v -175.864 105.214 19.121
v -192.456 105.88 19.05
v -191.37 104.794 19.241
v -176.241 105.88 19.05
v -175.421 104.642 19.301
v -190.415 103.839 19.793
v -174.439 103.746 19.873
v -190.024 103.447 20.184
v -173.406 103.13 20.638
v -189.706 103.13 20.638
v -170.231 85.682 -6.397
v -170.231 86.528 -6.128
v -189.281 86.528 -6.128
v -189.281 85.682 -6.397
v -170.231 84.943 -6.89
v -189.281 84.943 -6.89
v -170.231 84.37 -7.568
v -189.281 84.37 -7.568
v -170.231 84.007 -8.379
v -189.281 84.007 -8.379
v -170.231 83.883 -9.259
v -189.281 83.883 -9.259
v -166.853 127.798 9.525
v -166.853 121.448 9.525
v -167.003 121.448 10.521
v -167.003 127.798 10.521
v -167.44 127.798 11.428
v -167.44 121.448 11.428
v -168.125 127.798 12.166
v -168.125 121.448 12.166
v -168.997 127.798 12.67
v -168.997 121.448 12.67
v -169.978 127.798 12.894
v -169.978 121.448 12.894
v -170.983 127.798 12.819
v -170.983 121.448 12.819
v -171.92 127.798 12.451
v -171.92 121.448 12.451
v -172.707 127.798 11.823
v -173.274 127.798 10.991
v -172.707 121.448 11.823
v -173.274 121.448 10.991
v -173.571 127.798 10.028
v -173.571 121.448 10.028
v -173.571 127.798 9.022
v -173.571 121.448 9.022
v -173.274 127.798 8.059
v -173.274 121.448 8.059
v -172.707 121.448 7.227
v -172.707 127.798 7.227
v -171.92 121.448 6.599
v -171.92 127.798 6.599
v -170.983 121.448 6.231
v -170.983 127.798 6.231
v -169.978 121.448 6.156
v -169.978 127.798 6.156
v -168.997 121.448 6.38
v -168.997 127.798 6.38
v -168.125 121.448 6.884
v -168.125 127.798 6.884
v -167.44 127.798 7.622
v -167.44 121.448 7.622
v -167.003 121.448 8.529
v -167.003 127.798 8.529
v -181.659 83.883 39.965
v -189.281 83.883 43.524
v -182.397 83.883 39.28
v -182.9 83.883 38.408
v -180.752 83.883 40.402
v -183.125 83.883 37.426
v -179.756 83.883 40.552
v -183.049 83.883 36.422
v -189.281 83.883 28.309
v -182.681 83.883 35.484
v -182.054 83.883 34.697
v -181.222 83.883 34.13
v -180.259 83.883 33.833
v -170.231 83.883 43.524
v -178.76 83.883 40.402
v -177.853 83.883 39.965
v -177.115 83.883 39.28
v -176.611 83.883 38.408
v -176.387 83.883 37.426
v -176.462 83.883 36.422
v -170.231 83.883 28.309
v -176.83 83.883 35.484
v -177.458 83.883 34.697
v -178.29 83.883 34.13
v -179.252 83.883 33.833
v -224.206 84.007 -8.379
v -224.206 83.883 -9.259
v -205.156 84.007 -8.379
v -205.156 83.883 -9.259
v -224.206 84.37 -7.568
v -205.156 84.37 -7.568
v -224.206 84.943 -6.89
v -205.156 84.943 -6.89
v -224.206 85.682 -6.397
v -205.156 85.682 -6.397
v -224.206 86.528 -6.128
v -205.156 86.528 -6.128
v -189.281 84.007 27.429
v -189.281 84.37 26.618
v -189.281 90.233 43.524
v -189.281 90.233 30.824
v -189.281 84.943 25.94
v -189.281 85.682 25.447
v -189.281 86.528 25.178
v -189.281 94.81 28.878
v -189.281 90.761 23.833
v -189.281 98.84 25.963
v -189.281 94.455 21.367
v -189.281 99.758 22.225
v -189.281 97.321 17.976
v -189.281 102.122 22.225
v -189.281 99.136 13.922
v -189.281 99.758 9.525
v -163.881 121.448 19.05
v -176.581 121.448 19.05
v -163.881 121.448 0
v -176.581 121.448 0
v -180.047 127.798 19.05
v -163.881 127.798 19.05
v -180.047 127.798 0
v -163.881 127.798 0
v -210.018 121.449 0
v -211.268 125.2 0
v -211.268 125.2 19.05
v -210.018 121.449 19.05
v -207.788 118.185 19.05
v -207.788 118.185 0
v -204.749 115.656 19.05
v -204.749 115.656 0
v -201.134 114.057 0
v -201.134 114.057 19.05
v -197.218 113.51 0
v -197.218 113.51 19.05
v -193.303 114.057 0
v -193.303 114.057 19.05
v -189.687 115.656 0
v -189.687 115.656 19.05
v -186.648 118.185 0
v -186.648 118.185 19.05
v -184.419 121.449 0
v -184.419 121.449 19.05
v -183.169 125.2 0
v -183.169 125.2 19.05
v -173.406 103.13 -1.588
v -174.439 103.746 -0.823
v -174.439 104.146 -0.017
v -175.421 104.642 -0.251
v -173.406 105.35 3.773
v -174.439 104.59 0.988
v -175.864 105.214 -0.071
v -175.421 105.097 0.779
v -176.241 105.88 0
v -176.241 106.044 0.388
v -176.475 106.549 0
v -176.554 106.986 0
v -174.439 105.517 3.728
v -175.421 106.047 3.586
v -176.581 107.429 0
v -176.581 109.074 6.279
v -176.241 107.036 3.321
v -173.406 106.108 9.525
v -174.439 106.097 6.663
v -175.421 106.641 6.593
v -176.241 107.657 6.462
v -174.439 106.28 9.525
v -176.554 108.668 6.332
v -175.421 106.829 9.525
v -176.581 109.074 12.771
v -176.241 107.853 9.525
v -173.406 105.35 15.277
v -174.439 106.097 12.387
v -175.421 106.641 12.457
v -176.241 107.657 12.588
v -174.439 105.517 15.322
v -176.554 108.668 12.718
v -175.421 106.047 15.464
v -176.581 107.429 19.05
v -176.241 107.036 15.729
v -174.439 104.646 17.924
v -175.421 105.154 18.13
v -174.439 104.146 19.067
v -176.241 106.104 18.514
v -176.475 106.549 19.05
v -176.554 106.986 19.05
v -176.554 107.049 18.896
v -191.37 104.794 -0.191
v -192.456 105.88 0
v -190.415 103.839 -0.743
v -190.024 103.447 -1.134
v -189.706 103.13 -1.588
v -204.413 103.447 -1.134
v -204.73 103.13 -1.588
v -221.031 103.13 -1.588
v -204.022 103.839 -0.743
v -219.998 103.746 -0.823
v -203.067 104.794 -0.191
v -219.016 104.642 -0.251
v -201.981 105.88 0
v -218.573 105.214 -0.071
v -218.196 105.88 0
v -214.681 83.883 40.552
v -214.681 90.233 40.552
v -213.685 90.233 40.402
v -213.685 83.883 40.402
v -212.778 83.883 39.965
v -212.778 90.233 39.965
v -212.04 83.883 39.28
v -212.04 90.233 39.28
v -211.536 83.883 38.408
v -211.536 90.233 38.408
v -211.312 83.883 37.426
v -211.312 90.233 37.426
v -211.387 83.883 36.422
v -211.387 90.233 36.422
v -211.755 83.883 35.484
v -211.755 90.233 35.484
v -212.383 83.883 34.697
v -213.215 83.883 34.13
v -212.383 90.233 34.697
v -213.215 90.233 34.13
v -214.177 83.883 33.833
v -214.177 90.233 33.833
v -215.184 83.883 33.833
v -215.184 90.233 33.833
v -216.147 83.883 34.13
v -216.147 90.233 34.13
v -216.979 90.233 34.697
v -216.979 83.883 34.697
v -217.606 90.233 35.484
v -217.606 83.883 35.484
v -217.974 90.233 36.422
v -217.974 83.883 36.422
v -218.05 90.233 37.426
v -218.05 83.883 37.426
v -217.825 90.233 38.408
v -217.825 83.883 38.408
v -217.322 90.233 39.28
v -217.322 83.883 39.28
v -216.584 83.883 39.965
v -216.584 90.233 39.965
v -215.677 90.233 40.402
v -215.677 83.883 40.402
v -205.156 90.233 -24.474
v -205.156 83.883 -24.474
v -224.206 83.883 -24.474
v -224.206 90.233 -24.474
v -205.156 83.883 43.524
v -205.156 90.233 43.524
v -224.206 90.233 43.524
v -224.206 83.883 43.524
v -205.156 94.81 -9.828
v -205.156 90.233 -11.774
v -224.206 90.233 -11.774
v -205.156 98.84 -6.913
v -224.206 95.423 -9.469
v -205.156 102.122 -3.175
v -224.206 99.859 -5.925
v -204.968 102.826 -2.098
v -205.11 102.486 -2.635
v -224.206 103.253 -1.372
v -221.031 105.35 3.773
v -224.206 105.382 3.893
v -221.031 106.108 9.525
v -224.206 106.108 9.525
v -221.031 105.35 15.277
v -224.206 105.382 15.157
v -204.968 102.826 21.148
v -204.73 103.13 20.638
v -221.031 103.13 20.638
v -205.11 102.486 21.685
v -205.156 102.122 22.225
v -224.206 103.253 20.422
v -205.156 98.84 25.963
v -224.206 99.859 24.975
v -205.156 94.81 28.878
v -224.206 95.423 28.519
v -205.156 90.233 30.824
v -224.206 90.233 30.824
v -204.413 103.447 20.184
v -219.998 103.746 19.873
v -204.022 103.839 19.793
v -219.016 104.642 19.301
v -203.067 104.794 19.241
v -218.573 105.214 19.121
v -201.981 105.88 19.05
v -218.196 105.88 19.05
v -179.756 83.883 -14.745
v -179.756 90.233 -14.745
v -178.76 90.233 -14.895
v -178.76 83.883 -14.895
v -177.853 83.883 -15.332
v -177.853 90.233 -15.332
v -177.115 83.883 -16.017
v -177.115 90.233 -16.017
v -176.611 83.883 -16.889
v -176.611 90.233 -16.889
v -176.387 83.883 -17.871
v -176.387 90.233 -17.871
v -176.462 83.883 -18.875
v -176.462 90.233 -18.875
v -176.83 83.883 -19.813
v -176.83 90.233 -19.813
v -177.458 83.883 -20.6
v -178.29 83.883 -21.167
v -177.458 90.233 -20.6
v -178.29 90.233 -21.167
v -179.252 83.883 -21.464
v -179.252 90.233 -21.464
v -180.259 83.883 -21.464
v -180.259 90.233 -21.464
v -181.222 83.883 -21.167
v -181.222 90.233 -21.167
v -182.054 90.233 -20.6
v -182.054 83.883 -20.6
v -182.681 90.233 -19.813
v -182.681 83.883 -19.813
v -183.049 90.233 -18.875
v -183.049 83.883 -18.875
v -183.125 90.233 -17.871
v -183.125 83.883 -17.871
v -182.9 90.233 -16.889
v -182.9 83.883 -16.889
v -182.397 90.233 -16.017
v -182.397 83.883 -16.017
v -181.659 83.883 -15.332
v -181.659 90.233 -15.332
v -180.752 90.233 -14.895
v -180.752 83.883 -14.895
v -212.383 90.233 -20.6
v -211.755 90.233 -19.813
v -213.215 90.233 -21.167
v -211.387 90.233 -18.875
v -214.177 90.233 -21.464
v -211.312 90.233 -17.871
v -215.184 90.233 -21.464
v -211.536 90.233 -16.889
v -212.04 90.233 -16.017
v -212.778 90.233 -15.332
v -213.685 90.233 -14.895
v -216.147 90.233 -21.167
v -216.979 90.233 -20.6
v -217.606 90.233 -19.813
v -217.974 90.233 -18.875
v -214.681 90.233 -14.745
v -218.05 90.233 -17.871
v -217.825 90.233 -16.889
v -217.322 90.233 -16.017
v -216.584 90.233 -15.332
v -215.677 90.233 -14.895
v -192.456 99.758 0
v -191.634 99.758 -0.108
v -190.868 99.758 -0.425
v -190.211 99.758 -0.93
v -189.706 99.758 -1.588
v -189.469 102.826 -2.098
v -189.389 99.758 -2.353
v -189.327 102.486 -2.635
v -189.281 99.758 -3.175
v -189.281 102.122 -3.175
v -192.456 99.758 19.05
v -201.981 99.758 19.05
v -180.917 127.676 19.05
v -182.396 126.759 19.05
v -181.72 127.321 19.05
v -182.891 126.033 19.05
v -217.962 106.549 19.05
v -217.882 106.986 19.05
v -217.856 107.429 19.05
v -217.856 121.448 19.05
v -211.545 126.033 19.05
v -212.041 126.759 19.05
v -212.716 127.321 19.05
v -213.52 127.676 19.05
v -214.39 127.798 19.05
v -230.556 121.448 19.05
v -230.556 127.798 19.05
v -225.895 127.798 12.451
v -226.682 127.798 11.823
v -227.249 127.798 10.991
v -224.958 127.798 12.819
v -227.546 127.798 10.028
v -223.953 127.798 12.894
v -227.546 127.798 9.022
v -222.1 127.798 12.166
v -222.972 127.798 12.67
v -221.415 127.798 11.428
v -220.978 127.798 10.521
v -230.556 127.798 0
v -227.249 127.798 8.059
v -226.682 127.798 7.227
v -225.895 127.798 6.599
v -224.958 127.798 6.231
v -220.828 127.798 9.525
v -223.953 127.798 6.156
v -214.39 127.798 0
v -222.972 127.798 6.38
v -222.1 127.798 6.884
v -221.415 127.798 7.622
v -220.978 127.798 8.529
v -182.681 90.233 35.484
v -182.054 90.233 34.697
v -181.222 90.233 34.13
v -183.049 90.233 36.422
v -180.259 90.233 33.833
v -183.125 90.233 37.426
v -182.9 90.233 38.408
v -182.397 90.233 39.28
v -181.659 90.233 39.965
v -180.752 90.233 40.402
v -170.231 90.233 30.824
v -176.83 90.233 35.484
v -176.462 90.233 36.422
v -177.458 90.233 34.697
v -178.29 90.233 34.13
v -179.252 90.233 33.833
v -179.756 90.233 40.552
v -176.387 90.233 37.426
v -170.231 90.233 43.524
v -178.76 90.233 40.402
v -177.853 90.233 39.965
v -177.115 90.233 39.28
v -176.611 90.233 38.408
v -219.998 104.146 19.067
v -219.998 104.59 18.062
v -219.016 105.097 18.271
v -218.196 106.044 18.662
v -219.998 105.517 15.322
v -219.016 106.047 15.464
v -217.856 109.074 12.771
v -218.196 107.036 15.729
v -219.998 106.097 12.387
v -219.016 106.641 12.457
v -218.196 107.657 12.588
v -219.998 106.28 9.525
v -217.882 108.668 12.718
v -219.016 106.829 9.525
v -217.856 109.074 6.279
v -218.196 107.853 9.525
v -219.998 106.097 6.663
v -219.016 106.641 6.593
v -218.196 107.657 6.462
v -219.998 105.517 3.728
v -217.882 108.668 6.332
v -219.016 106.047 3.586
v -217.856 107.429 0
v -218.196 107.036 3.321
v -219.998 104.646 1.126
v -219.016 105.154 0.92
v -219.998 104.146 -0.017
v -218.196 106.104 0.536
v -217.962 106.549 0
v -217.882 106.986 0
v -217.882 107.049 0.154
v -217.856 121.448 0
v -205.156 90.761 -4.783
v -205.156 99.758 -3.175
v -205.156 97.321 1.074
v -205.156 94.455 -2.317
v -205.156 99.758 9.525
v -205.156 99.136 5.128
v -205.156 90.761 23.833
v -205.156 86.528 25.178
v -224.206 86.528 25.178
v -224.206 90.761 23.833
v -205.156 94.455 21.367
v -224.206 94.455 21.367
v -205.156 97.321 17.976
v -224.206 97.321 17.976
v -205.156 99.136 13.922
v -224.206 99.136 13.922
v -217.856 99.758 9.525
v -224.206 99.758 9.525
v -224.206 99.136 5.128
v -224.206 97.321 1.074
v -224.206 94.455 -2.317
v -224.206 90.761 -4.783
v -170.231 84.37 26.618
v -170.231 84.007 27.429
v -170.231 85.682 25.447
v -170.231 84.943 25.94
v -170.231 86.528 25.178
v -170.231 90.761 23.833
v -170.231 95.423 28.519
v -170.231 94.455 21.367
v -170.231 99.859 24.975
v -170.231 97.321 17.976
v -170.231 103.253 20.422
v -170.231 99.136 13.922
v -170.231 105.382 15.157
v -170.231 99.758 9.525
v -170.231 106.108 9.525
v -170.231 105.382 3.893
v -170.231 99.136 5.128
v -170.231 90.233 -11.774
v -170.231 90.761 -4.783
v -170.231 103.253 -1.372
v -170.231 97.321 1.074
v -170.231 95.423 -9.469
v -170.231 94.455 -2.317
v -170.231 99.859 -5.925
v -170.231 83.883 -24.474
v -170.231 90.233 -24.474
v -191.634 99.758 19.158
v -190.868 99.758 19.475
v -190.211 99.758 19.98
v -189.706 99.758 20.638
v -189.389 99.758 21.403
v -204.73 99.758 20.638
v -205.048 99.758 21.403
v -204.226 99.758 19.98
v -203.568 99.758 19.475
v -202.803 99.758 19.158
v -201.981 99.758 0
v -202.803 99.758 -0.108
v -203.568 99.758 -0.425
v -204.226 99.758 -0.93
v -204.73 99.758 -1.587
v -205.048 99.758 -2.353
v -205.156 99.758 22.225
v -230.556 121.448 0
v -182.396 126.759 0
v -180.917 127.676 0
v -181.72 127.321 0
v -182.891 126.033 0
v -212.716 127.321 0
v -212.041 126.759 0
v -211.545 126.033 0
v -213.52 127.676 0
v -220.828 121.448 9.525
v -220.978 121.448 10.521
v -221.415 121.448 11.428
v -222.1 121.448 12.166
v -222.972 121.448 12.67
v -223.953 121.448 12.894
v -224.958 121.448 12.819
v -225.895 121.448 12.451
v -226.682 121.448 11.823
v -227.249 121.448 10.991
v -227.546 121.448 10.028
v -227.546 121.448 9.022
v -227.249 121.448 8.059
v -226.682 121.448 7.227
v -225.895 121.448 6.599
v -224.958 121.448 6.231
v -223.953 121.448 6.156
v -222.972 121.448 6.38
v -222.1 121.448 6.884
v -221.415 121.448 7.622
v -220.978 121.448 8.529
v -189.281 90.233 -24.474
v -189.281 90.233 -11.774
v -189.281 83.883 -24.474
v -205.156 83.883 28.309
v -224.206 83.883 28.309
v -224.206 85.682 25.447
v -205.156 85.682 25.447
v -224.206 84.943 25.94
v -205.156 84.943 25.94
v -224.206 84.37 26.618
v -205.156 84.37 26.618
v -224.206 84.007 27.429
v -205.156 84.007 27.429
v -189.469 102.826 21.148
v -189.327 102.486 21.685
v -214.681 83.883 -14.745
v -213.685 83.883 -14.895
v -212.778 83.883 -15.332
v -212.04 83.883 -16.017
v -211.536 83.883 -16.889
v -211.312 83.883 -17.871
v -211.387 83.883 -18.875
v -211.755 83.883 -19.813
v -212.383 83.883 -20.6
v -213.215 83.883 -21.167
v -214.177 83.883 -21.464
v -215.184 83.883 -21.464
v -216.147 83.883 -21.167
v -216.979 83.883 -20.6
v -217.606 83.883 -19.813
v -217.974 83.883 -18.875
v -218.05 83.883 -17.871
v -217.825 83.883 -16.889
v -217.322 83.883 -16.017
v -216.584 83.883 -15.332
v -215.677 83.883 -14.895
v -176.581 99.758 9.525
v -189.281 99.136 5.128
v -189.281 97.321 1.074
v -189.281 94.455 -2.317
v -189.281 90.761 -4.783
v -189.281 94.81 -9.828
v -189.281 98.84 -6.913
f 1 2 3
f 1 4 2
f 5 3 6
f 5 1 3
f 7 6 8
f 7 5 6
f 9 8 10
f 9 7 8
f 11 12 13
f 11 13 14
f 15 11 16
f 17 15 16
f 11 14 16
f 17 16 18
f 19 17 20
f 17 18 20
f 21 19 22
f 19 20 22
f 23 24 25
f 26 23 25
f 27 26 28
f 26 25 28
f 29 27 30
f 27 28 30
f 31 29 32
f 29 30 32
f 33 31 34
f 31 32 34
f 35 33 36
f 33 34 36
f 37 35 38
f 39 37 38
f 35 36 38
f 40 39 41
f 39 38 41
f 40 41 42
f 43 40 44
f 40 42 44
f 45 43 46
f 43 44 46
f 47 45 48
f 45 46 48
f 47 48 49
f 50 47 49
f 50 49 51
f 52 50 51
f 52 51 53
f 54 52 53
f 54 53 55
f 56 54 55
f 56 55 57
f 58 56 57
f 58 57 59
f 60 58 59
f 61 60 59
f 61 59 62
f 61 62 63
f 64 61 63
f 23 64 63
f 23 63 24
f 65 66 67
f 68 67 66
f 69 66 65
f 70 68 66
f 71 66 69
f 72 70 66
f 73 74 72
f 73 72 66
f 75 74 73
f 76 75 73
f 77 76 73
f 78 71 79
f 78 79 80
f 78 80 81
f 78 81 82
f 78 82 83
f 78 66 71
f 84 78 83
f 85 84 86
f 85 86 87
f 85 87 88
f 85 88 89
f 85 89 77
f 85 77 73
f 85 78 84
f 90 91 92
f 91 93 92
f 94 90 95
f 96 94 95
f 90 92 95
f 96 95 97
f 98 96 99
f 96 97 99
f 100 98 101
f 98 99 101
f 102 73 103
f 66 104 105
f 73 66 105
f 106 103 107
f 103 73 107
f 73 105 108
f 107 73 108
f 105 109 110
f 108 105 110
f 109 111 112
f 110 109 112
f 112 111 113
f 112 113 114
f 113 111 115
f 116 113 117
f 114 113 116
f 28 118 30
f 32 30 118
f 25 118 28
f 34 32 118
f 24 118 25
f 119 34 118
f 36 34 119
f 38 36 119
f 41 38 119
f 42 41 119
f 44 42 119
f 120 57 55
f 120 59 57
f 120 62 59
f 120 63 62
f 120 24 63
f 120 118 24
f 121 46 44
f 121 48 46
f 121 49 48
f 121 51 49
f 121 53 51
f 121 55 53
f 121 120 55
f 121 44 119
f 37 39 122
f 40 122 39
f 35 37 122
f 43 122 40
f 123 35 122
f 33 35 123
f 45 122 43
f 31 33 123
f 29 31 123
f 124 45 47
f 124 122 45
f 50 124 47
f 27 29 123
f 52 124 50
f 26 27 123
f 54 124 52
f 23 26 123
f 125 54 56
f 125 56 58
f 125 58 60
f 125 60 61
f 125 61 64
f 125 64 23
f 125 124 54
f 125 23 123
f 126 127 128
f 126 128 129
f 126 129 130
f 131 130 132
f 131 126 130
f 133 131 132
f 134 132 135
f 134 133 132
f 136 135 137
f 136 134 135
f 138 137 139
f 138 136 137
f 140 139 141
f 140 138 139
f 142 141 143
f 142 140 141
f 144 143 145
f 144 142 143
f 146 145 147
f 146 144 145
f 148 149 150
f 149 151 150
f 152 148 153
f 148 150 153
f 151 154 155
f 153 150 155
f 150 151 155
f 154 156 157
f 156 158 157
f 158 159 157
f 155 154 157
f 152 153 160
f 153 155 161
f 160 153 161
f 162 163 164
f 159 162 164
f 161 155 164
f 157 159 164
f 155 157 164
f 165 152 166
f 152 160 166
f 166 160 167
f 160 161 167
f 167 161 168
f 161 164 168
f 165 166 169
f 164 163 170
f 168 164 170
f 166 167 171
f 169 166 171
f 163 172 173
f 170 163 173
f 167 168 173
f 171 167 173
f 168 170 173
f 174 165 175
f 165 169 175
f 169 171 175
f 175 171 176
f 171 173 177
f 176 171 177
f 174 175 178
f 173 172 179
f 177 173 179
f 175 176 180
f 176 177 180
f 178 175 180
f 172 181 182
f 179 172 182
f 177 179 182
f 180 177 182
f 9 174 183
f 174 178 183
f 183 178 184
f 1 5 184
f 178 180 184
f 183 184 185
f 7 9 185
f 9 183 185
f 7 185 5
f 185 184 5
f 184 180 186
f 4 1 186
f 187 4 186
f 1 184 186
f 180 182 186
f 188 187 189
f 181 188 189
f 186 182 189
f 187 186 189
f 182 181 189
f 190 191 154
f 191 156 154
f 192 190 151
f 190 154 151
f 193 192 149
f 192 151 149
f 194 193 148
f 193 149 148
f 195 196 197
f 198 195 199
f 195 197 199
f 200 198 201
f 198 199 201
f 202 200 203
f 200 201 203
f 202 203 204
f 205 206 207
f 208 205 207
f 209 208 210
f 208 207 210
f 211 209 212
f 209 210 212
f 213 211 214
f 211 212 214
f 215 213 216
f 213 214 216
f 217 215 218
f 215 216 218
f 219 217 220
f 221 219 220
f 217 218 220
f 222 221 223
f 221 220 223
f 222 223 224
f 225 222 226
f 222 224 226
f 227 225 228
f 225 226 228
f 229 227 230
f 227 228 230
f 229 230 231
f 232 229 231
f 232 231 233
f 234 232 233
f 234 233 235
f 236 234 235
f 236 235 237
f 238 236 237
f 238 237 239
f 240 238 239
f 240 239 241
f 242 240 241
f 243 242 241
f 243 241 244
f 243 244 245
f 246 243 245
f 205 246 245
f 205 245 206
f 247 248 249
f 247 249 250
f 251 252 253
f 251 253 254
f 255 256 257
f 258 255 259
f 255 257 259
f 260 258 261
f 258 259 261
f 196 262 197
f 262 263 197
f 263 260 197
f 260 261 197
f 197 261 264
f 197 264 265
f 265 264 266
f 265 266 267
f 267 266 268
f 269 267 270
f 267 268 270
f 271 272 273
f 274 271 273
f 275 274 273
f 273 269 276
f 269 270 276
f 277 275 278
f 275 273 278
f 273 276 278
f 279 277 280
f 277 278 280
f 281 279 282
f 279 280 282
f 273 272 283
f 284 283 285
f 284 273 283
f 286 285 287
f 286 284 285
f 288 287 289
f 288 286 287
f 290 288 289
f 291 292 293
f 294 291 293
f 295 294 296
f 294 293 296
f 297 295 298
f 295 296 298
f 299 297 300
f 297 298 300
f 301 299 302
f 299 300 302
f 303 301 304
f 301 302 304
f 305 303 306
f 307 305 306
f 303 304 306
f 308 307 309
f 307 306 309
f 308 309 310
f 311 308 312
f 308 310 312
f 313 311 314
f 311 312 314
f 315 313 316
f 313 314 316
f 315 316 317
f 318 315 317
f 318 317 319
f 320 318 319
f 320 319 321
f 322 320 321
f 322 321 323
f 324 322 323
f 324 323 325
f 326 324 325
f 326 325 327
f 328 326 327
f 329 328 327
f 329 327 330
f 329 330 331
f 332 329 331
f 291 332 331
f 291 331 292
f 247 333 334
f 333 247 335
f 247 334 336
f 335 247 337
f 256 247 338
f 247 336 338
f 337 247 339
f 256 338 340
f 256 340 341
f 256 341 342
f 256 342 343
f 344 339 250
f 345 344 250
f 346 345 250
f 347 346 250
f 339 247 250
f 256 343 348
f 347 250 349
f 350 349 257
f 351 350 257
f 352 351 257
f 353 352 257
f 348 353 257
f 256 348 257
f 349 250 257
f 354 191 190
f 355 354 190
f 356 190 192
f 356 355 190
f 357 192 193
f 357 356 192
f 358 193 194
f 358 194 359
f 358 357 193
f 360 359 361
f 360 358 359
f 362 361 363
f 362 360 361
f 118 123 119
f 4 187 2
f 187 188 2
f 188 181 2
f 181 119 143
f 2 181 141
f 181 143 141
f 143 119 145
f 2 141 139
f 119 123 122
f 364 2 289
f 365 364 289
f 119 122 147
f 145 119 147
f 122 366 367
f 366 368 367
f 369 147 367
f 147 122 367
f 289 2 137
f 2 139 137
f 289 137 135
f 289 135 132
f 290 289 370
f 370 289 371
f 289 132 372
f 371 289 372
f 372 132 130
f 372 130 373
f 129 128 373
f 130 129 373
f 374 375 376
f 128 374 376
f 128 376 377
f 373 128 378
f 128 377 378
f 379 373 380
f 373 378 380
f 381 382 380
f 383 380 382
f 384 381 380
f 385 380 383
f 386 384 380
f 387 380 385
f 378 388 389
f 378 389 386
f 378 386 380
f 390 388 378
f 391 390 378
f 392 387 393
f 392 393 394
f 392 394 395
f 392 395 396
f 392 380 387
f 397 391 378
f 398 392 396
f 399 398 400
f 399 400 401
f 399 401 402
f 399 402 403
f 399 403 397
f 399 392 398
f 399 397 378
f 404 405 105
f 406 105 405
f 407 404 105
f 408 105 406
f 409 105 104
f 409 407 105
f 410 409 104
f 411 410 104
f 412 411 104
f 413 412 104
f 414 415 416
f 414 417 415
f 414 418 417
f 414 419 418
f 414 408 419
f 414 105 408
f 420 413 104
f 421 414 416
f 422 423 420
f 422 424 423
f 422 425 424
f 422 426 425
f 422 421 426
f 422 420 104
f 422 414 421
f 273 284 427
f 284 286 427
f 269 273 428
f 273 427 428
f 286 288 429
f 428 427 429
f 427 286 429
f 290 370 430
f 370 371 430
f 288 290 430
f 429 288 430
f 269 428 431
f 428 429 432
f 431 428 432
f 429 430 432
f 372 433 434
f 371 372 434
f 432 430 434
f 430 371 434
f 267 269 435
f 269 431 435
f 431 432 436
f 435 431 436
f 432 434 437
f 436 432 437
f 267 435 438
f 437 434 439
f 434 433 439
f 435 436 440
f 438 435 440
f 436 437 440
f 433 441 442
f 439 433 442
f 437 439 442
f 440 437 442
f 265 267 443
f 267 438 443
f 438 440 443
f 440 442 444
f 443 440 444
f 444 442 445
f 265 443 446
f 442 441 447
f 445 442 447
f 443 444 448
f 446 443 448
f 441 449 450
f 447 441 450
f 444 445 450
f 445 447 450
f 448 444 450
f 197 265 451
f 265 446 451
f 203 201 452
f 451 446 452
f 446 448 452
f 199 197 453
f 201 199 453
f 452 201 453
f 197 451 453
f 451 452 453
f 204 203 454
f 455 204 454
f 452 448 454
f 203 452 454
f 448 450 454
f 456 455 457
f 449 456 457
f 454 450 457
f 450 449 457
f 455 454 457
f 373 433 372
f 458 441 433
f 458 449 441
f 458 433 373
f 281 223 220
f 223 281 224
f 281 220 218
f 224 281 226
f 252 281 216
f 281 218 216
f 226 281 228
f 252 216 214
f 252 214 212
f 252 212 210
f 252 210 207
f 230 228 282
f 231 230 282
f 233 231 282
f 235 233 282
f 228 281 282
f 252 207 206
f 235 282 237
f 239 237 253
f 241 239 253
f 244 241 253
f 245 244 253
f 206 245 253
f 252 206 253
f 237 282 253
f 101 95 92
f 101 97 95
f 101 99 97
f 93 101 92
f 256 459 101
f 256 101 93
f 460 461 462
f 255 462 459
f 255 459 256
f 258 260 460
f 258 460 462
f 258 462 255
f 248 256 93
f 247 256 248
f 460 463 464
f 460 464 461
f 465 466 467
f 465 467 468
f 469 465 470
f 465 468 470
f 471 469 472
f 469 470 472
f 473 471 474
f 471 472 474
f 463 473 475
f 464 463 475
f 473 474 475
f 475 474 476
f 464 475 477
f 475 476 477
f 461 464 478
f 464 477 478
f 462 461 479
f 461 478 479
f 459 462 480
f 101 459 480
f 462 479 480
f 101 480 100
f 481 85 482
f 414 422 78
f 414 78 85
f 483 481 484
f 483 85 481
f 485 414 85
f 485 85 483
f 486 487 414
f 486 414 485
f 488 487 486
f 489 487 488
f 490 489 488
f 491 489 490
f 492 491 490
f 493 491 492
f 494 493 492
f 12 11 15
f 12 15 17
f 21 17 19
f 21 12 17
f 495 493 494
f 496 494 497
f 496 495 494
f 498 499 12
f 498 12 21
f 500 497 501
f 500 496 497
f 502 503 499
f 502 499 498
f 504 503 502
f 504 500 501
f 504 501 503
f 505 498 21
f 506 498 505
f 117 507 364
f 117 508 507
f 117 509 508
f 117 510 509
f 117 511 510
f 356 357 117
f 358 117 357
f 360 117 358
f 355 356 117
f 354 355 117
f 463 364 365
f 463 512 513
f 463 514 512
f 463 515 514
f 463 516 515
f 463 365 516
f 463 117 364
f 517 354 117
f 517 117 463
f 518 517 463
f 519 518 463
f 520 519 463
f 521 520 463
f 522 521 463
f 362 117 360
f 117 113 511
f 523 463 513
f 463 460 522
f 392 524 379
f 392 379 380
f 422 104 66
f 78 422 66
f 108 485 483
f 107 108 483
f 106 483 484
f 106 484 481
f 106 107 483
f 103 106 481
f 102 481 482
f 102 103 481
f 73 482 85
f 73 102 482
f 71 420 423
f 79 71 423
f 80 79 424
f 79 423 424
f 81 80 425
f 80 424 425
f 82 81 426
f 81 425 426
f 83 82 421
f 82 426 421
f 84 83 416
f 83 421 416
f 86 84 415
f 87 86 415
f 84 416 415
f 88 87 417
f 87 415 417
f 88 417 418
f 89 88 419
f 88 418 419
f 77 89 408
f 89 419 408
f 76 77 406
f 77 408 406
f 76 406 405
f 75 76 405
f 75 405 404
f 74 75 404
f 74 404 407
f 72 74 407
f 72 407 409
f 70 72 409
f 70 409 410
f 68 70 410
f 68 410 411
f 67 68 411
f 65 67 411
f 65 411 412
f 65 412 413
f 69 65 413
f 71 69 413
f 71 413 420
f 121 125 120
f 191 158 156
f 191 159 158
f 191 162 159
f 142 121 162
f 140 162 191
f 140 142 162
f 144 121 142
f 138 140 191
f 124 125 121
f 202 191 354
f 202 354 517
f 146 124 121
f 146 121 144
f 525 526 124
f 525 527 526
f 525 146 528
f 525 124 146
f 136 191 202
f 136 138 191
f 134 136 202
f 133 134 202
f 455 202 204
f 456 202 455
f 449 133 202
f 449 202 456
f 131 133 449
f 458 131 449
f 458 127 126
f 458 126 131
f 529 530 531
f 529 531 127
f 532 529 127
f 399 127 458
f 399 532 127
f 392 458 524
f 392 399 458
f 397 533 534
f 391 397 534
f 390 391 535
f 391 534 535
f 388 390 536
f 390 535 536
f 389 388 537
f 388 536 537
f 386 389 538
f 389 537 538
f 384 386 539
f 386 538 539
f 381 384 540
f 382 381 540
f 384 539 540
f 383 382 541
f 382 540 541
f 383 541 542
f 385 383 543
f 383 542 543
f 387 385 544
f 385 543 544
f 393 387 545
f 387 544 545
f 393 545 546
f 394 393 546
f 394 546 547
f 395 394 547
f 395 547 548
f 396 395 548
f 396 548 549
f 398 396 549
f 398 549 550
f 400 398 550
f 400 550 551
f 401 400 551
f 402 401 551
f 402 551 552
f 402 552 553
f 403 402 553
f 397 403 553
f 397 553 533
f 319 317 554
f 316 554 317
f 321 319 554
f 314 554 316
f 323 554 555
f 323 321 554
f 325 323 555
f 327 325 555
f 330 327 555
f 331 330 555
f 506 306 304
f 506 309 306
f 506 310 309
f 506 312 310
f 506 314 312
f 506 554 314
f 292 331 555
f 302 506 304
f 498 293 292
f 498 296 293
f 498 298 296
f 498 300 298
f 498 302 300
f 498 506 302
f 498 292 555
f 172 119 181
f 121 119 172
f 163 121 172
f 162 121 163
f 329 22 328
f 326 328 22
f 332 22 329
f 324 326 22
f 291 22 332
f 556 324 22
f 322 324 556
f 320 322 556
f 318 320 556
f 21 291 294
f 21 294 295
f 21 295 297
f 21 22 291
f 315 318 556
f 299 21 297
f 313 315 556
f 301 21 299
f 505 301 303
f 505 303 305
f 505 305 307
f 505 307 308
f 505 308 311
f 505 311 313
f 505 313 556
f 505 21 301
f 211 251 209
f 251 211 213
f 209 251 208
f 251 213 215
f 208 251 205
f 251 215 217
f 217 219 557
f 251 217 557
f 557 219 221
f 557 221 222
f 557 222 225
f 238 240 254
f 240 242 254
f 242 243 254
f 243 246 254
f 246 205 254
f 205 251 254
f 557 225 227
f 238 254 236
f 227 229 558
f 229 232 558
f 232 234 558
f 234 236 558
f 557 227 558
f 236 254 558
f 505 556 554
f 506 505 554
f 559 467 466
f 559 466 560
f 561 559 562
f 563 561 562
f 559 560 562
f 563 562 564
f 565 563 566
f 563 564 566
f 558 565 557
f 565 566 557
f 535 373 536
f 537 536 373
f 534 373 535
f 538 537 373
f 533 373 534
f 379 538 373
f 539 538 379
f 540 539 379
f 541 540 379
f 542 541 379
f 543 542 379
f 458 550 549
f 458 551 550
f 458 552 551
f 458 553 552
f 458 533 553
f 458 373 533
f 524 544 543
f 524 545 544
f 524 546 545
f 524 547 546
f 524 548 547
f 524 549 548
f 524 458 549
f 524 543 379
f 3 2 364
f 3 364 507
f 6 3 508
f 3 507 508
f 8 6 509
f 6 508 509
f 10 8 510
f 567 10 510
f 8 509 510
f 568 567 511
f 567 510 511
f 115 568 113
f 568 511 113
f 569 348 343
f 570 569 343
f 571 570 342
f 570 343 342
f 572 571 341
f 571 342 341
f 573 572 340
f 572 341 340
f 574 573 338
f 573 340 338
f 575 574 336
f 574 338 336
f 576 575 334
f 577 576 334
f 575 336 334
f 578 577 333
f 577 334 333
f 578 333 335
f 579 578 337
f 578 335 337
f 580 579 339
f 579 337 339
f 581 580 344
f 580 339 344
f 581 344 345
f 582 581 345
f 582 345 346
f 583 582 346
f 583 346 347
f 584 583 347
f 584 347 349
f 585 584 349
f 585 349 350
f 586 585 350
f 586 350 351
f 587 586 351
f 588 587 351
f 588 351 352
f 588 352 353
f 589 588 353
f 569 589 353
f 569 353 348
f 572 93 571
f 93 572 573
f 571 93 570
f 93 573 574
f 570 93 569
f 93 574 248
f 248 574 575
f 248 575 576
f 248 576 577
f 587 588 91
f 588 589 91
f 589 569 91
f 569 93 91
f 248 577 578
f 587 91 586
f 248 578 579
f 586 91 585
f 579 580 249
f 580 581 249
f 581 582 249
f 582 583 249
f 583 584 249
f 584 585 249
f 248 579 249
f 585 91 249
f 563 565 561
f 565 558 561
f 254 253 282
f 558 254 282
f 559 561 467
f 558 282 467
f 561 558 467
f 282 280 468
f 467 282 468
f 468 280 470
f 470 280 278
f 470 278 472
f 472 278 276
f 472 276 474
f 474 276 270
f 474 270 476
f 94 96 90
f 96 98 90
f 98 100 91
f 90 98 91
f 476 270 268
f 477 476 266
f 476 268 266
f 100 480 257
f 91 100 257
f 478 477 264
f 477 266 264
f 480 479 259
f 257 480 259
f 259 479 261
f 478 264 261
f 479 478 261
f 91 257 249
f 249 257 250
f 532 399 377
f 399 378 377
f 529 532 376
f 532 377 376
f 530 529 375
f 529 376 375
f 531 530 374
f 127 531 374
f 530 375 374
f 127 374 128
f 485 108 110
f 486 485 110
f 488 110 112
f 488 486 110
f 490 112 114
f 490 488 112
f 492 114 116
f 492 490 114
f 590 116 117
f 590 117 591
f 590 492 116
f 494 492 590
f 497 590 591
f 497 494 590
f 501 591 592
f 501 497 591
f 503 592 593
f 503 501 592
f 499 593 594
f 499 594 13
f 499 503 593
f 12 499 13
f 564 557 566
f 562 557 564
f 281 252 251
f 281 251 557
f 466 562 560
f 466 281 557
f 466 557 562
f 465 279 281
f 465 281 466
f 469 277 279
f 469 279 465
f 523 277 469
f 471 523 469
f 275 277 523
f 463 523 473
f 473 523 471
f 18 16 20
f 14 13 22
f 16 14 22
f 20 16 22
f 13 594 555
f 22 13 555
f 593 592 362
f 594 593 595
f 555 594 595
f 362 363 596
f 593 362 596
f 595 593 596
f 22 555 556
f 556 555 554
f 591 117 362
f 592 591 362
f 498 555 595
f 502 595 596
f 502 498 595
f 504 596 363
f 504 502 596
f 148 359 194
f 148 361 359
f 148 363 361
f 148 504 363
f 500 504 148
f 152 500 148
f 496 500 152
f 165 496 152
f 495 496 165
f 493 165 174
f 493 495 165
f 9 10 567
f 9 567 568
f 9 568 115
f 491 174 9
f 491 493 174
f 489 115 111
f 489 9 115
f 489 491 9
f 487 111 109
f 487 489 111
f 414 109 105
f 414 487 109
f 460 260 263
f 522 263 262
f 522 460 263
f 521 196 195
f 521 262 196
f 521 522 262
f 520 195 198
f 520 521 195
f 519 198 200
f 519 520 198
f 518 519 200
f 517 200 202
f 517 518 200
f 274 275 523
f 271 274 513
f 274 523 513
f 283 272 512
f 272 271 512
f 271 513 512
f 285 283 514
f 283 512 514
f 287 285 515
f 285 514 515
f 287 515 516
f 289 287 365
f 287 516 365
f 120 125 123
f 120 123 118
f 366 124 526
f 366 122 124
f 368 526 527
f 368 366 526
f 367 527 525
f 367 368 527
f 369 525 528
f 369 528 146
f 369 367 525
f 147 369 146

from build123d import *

# Parameters (mm, degrees)
BOSS_EXTRUDE1_DEPTH = 19.05
SKETCH7_R           = 3.3782
CUT_EXTRUDE3_DEPTH  = 233.356054205
BOSS_EXTRUDE3_START = -6.35
BOSS_EXTRUDE3_DEPTH = 19.05
SKETCH11_R          = 3.3782
CUT_EXTRUDE4_DEPTH  = 238.616089602
FILLET4_R           = 3.175


with BuildPart() as part:
    # Sketch1 → Boss-Extrude1 (new body)
    with BuildSketch(Plane.XY):
        with BuildLine():
            Line((-182.9308, 127.79756), (-163.8808, 127.79756))
            Line((-163.8808, 127.79756), (-163.8808, 121.44756))
            Line((-163.8808, 121.44756), (-176.5808, 121.44756))
            Line((-176.5808, 121.44756), (-176.5808, 99.757550505))
            Line((-176.5808, 99.757550505), (-217.8558, 99.757550505))
            Line((-217.8558, 99.757550505), (-217.8558, 121.44756))
            Line((-217.8558, 121.44756), (-230.5558, 121.44756))
            Line((-230.5558, 121.44756), (-230.5558, 127.79756))
            Line((-230.5558, 127.79756), (-211.5058, 127.79756))
            ThreePointArc((-211.5058, 127.79756), (-197.2183, 113.51006), (-182.9308, 127.79756))
        make_face()
    extrude(amount=BOSS_EXTRUDE1_DEPTH)

    # Sketch7 → Cut-Extrude3 (cut, through all)
    with BuildSketch(Plane.XZ.offset(-121.44756)):
        with Locations((-170.2308, 9.525)):
            Circle(SKETCH7_R)
        with Locations((-224.2058, 9.525)):
            Circle(SKETCH7_R)
    extrude(amount=-CUT_EXTRUDE3_DEPTH, mode=Mode.SUBTRACT)

    # Sketch10 → Boss-Extrude3 (add)
    with BuildSketch(Plane(origin=(-163.8808, 0, 0), x_dir=(0, 0, -1), z_dir=(1, 0, 0)).offset(BOSS_EXTRUDE3_START)):
        with BuildLine():
            Line((6.35, 83.882550505), (24.473547486, 83.882550505))
            Line((24.473547486, 83.882550505), (24.473547486, 90.232550505))
            Line((24.473547486, 90.232550505), (11.773547486, 90.232550505))
            ThreePointArc((11.773547486, 90.232550505), (-9.525, 106.107550505), (-30.823547486, 90.232550505))
            Line((-30.823547486, 90.232550505), (-43.523547486, 90.232550505))
            Line((-43.523547486, 90.232550505), (-43.523547486, 83.882550505))
            Line((-43.523547486, 83.882550505), (-25.4, 83.882550505))
            ThreePointArc((-25.4, 83.882550505), (-9.525, 99.757550505), (6.35, 83.882550505))
        make_face()
    boss_extrude3 = extrude(amount=-BOSS_EXTRUDE3_DEPTH)

    # Mirror3: Boss-Extrude3 across plane
    add(boss_extrude3.mirror(Plane(origin=(-197.2183, 0, 0), x_dir=(0, 0, 1), z_dir=(1, 0, 0))))

    # Sketch11 → Cut-Extrude4 (cut, through all)
    with BuildSketch(Plane(origin=(0, 90.232550505, 0), x_dir=(1, 0, 0), z_dir=(0, 1, 0))):
        with Locations(Location((-179.7558, -37.173547486, 0), (0, 0, 270))):
            Circle(SKETCH11_R)
        with Locations(Location((-179.7558, 18.123547486, 0), (0, 0, 270))):
            Circle(SKETCH11_R)
        with Locations(Location((-214.6808, 18.123547486, 0), (0, 0, 270))):
            Circle(SKETCH11_R)
        with Locations(Location((-214.6808, -37.173547486, 0), (0, 0, 270))):
            Circle(SKETCH11_R)
    extrude(amount=-CUT_EXTRUDE4_DEPTH, mode=Mode.SUBTRACT)

    # Fillet4
    fillet4_edges = [part.edges().sort_by_distance(p)[0] for p in [
        (-182.9308, 127.79756, 9.525),
        (-211.5058, 127.79756, 9.525),
        (-189.2808, 101.860282076, 0),
        (-182.9308, 103.963013647, 0),
        (-189.2808, 101.860282076, 19.05),
        (-179.7558, 83.882550505, -6.35),
        (-179.7558, 83.882550505, 25.4),
        (-182.9308, 103.963013647, 19.05),
        (-176.5808, 106.107550505, 9.525),
        (-205.1558, 101.860282076, 0),
        (-211.5058, 103.963013647, 0),
        (-211.5058, 103.963013647, 19.05),
        (-217.8558, 106.107550505, 9.525),
        (-205.1558, 101.860282076, 19.05),
        (-214.6808, 83.882550505, 25.4),
        (-214.6808, 83.882550505, -6.35),
    ]]
    fillet(fillet4_edges, radius=FILLET4_R)


solid = part.part
